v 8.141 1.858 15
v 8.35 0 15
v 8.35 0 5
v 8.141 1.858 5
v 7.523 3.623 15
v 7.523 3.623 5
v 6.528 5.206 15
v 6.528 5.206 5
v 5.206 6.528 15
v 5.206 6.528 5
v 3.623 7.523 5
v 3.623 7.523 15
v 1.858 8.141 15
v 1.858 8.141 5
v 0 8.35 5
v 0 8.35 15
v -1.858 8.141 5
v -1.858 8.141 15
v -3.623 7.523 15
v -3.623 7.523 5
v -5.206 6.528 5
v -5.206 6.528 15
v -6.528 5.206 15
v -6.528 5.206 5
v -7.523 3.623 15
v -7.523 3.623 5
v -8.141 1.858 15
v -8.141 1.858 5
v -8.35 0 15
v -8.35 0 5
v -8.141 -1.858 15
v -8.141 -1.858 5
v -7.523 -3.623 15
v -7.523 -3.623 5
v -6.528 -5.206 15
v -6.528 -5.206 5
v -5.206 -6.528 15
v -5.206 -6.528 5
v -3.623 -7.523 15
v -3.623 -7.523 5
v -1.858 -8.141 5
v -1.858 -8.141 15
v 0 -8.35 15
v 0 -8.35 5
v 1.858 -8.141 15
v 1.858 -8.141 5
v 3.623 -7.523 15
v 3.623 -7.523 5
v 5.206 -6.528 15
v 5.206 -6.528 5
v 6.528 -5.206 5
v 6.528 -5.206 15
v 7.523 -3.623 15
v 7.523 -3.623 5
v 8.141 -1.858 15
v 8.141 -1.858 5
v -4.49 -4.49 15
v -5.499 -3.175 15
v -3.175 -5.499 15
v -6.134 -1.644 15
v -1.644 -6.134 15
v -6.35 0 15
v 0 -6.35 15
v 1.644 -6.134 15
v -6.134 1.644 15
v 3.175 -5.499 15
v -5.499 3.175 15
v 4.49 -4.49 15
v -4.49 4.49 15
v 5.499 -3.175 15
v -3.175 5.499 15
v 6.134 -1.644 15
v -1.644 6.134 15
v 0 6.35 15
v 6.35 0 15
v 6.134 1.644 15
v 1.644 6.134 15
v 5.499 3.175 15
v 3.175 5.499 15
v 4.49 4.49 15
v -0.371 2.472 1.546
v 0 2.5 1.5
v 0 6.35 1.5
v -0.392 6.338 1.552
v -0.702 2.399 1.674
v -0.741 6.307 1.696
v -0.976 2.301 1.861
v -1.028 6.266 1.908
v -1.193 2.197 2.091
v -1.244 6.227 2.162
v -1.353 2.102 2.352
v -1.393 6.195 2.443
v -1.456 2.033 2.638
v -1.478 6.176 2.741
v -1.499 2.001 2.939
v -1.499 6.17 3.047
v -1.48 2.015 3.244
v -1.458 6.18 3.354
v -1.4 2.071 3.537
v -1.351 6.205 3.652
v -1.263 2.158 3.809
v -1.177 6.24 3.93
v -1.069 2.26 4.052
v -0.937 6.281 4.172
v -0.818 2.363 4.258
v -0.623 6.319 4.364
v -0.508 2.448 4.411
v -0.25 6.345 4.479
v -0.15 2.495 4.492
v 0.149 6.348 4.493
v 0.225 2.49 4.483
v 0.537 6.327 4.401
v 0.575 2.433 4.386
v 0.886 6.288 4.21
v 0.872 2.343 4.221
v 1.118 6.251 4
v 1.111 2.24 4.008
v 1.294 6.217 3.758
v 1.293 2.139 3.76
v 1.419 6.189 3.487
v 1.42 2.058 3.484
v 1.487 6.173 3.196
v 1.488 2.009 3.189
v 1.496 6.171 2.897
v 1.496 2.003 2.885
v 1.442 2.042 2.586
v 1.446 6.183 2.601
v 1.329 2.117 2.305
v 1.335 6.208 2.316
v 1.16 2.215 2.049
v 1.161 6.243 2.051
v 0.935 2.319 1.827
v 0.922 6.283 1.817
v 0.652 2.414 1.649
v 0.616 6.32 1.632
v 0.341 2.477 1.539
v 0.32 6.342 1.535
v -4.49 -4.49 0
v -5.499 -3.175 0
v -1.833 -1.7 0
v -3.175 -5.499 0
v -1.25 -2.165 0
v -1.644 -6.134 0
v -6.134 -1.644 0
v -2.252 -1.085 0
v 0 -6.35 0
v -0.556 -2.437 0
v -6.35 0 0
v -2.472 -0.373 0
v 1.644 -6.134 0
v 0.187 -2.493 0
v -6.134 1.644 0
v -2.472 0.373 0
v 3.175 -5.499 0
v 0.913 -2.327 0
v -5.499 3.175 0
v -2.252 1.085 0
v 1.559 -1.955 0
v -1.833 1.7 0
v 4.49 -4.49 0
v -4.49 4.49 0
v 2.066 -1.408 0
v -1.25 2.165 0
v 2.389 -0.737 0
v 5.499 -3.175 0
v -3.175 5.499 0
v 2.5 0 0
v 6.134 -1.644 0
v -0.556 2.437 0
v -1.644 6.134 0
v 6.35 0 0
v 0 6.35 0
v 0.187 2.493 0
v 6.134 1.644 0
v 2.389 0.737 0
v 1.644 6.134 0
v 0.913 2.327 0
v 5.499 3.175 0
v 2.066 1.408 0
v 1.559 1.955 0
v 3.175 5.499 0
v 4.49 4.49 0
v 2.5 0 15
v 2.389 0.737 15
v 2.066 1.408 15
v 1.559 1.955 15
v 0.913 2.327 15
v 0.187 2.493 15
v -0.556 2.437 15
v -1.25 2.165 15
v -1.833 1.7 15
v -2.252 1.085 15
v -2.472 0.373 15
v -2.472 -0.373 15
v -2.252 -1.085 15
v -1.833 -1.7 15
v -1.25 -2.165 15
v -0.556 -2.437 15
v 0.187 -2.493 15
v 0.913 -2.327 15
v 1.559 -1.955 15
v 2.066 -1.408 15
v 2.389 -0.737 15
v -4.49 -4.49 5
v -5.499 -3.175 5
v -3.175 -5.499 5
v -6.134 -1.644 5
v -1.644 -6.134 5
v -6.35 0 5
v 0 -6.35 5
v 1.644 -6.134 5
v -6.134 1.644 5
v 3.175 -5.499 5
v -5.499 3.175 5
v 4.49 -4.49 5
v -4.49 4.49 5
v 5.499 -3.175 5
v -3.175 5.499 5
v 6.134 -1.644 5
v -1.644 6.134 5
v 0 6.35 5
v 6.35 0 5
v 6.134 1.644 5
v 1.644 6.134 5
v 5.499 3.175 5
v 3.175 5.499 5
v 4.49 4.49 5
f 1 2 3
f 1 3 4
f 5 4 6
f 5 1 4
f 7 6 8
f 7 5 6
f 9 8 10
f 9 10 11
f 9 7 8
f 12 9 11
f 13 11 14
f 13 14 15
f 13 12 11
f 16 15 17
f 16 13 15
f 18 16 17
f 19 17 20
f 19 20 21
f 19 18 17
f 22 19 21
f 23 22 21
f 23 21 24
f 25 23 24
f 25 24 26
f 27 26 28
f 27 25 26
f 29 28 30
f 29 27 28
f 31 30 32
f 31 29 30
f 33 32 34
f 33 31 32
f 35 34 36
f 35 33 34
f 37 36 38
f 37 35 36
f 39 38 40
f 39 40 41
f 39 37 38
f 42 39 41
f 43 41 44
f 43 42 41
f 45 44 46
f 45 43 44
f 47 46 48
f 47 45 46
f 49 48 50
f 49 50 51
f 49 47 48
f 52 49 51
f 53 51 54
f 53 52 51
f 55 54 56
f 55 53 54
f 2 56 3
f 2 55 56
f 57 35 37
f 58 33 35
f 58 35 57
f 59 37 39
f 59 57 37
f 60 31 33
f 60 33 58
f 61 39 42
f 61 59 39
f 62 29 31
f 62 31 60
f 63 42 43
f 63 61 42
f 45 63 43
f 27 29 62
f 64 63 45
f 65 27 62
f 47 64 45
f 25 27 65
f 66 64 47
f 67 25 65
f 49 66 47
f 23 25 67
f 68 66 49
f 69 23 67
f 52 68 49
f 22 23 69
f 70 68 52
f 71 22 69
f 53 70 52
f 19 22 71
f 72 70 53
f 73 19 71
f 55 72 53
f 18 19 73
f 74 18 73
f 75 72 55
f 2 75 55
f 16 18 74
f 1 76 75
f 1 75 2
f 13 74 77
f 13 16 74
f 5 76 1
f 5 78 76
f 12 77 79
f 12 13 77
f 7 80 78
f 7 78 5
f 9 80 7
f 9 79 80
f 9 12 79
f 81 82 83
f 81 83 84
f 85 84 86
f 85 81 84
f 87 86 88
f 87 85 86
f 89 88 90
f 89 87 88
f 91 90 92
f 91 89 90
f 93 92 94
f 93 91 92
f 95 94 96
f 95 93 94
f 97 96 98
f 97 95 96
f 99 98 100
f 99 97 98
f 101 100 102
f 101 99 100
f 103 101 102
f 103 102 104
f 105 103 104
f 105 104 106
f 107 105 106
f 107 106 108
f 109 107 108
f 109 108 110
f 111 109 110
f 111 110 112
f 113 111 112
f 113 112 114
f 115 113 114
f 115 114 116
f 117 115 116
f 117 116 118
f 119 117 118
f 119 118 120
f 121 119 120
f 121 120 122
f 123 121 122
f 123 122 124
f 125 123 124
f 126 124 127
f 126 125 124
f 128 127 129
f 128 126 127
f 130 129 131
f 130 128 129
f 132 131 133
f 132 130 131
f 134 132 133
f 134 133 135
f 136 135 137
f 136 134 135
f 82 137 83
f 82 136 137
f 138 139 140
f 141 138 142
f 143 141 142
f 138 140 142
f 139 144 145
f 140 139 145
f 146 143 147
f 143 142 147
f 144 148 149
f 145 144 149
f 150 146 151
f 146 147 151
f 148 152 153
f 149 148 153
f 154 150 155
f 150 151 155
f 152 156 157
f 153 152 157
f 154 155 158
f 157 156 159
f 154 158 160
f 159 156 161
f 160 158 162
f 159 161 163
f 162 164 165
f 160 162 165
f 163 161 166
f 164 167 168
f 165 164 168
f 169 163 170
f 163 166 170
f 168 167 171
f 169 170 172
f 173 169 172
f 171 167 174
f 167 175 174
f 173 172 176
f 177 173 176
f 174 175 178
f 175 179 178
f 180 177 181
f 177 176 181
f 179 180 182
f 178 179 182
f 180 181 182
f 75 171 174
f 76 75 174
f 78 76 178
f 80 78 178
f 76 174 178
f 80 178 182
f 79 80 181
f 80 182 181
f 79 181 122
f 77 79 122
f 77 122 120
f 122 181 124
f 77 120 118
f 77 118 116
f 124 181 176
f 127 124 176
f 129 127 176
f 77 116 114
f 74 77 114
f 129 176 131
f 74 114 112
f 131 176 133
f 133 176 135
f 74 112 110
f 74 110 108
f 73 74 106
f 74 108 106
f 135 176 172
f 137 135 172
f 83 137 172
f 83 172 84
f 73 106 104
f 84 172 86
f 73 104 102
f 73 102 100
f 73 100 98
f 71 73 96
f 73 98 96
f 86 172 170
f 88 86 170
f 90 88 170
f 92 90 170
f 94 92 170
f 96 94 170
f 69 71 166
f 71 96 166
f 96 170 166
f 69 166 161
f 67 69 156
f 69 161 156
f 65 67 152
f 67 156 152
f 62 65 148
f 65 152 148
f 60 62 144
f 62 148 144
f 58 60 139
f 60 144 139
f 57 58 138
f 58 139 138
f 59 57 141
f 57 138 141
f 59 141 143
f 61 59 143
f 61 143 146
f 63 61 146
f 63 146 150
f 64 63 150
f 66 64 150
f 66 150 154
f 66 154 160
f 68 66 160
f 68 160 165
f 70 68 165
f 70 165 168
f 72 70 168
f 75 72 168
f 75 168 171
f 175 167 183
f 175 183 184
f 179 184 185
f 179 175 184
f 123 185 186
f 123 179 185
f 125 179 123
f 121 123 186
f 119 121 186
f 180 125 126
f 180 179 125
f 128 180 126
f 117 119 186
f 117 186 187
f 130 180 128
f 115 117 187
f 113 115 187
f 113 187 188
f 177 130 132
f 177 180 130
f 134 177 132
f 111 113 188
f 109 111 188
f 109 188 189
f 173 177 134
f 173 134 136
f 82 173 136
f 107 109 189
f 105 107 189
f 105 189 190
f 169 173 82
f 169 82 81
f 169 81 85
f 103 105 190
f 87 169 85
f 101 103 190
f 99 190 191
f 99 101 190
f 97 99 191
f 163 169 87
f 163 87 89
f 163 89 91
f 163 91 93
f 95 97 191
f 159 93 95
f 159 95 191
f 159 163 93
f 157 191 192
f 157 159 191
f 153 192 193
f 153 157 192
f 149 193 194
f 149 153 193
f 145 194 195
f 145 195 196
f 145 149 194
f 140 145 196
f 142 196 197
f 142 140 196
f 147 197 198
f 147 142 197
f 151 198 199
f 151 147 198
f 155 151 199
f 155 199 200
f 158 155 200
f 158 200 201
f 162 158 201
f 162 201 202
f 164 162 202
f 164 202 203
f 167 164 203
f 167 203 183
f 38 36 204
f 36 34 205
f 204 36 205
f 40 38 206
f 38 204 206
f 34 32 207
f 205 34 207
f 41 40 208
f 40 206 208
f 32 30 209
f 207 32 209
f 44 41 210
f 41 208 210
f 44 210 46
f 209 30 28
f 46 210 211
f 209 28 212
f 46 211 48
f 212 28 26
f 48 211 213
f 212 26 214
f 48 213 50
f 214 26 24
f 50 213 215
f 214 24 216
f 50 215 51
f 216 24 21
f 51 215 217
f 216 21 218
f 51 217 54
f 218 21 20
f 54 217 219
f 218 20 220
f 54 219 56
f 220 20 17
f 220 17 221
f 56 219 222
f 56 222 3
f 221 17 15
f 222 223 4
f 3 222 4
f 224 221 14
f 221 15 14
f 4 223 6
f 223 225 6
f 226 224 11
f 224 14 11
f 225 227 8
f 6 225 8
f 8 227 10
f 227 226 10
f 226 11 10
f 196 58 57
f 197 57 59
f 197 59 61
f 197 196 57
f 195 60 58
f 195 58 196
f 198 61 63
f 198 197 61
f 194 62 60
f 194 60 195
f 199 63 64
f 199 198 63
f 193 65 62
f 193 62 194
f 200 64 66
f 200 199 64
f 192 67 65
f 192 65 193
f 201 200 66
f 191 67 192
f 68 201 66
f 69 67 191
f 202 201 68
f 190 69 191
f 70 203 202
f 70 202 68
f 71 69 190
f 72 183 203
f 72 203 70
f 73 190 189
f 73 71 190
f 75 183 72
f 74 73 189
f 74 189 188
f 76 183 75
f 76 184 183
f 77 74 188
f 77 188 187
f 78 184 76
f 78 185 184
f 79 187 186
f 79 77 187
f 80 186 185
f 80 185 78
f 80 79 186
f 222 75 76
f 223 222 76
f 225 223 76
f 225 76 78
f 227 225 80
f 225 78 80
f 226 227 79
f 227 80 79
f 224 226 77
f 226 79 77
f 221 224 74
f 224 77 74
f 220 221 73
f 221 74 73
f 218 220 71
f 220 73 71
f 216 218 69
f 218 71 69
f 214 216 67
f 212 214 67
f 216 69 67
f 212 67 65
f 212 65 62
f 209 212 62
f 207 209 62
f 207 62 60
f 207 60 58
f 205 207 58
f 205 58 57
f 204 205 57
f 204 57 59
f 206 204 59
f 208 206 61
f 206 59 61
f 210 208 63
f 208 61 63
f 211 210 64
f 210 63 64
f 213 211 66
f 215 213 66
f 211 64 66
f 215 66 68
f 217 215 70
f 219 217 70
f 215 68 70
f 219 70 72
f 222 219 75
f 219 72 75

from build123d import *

# Parameters (mm, degrees)
SKETCH1_R           = 6.35
SKETCH1_R_2         = 2.5
BOSS_EXTRUDE1_DEPTH = 15
SKETCH2_R           = 1.5
CUT_EXTRUDE1_DEPTH  = 18.48270574
SKETCH3_R           = 8.35
SKETCH3_R_2         = 6.35
BOSS_EXTRUDE2_DEPTH = 10


with BuildPart() as part:
    # Sketch1 → Boss-Extrude1 (new body)
    with BuildSketch(Plane.XY):
        Circle(SKETCH1_R)
        Circle(SKETCH1_R_2, mode=Mode.SUBTRACT)
    extrude(amount=BOSS_EXTRUDE1_DEPTH)

    # Sketch2 → Cut-Extrude1 (cut, through all)
    with BuildSketch(Plane(origin=(0, 0, 0), x_dir=(1, 0, 0), z_dir=(0, 1, 0))):
        with Locations(Location((0, -3, 0), (0, 0, 90))):
            Circle(SKETCH2_R)
    extrude(amount=CUT_EXTRUDE1_DEPTH, mode=Mode.SUBTRACT)


with BuildPart() as body_2:
    # Sketch3 → Boss-Extrude2 (new body)
    with BuildSketch(Plane.XY.offset(15)):
        Circle(SKETCH3_R)
        Circle(SKETCH3_R_2, mode=Mode.SUBTRACT)
    extrude(amount=-BOSS_EXTRUDE2_DEPTH)


solid = Compound([part.part, body_2.part])
